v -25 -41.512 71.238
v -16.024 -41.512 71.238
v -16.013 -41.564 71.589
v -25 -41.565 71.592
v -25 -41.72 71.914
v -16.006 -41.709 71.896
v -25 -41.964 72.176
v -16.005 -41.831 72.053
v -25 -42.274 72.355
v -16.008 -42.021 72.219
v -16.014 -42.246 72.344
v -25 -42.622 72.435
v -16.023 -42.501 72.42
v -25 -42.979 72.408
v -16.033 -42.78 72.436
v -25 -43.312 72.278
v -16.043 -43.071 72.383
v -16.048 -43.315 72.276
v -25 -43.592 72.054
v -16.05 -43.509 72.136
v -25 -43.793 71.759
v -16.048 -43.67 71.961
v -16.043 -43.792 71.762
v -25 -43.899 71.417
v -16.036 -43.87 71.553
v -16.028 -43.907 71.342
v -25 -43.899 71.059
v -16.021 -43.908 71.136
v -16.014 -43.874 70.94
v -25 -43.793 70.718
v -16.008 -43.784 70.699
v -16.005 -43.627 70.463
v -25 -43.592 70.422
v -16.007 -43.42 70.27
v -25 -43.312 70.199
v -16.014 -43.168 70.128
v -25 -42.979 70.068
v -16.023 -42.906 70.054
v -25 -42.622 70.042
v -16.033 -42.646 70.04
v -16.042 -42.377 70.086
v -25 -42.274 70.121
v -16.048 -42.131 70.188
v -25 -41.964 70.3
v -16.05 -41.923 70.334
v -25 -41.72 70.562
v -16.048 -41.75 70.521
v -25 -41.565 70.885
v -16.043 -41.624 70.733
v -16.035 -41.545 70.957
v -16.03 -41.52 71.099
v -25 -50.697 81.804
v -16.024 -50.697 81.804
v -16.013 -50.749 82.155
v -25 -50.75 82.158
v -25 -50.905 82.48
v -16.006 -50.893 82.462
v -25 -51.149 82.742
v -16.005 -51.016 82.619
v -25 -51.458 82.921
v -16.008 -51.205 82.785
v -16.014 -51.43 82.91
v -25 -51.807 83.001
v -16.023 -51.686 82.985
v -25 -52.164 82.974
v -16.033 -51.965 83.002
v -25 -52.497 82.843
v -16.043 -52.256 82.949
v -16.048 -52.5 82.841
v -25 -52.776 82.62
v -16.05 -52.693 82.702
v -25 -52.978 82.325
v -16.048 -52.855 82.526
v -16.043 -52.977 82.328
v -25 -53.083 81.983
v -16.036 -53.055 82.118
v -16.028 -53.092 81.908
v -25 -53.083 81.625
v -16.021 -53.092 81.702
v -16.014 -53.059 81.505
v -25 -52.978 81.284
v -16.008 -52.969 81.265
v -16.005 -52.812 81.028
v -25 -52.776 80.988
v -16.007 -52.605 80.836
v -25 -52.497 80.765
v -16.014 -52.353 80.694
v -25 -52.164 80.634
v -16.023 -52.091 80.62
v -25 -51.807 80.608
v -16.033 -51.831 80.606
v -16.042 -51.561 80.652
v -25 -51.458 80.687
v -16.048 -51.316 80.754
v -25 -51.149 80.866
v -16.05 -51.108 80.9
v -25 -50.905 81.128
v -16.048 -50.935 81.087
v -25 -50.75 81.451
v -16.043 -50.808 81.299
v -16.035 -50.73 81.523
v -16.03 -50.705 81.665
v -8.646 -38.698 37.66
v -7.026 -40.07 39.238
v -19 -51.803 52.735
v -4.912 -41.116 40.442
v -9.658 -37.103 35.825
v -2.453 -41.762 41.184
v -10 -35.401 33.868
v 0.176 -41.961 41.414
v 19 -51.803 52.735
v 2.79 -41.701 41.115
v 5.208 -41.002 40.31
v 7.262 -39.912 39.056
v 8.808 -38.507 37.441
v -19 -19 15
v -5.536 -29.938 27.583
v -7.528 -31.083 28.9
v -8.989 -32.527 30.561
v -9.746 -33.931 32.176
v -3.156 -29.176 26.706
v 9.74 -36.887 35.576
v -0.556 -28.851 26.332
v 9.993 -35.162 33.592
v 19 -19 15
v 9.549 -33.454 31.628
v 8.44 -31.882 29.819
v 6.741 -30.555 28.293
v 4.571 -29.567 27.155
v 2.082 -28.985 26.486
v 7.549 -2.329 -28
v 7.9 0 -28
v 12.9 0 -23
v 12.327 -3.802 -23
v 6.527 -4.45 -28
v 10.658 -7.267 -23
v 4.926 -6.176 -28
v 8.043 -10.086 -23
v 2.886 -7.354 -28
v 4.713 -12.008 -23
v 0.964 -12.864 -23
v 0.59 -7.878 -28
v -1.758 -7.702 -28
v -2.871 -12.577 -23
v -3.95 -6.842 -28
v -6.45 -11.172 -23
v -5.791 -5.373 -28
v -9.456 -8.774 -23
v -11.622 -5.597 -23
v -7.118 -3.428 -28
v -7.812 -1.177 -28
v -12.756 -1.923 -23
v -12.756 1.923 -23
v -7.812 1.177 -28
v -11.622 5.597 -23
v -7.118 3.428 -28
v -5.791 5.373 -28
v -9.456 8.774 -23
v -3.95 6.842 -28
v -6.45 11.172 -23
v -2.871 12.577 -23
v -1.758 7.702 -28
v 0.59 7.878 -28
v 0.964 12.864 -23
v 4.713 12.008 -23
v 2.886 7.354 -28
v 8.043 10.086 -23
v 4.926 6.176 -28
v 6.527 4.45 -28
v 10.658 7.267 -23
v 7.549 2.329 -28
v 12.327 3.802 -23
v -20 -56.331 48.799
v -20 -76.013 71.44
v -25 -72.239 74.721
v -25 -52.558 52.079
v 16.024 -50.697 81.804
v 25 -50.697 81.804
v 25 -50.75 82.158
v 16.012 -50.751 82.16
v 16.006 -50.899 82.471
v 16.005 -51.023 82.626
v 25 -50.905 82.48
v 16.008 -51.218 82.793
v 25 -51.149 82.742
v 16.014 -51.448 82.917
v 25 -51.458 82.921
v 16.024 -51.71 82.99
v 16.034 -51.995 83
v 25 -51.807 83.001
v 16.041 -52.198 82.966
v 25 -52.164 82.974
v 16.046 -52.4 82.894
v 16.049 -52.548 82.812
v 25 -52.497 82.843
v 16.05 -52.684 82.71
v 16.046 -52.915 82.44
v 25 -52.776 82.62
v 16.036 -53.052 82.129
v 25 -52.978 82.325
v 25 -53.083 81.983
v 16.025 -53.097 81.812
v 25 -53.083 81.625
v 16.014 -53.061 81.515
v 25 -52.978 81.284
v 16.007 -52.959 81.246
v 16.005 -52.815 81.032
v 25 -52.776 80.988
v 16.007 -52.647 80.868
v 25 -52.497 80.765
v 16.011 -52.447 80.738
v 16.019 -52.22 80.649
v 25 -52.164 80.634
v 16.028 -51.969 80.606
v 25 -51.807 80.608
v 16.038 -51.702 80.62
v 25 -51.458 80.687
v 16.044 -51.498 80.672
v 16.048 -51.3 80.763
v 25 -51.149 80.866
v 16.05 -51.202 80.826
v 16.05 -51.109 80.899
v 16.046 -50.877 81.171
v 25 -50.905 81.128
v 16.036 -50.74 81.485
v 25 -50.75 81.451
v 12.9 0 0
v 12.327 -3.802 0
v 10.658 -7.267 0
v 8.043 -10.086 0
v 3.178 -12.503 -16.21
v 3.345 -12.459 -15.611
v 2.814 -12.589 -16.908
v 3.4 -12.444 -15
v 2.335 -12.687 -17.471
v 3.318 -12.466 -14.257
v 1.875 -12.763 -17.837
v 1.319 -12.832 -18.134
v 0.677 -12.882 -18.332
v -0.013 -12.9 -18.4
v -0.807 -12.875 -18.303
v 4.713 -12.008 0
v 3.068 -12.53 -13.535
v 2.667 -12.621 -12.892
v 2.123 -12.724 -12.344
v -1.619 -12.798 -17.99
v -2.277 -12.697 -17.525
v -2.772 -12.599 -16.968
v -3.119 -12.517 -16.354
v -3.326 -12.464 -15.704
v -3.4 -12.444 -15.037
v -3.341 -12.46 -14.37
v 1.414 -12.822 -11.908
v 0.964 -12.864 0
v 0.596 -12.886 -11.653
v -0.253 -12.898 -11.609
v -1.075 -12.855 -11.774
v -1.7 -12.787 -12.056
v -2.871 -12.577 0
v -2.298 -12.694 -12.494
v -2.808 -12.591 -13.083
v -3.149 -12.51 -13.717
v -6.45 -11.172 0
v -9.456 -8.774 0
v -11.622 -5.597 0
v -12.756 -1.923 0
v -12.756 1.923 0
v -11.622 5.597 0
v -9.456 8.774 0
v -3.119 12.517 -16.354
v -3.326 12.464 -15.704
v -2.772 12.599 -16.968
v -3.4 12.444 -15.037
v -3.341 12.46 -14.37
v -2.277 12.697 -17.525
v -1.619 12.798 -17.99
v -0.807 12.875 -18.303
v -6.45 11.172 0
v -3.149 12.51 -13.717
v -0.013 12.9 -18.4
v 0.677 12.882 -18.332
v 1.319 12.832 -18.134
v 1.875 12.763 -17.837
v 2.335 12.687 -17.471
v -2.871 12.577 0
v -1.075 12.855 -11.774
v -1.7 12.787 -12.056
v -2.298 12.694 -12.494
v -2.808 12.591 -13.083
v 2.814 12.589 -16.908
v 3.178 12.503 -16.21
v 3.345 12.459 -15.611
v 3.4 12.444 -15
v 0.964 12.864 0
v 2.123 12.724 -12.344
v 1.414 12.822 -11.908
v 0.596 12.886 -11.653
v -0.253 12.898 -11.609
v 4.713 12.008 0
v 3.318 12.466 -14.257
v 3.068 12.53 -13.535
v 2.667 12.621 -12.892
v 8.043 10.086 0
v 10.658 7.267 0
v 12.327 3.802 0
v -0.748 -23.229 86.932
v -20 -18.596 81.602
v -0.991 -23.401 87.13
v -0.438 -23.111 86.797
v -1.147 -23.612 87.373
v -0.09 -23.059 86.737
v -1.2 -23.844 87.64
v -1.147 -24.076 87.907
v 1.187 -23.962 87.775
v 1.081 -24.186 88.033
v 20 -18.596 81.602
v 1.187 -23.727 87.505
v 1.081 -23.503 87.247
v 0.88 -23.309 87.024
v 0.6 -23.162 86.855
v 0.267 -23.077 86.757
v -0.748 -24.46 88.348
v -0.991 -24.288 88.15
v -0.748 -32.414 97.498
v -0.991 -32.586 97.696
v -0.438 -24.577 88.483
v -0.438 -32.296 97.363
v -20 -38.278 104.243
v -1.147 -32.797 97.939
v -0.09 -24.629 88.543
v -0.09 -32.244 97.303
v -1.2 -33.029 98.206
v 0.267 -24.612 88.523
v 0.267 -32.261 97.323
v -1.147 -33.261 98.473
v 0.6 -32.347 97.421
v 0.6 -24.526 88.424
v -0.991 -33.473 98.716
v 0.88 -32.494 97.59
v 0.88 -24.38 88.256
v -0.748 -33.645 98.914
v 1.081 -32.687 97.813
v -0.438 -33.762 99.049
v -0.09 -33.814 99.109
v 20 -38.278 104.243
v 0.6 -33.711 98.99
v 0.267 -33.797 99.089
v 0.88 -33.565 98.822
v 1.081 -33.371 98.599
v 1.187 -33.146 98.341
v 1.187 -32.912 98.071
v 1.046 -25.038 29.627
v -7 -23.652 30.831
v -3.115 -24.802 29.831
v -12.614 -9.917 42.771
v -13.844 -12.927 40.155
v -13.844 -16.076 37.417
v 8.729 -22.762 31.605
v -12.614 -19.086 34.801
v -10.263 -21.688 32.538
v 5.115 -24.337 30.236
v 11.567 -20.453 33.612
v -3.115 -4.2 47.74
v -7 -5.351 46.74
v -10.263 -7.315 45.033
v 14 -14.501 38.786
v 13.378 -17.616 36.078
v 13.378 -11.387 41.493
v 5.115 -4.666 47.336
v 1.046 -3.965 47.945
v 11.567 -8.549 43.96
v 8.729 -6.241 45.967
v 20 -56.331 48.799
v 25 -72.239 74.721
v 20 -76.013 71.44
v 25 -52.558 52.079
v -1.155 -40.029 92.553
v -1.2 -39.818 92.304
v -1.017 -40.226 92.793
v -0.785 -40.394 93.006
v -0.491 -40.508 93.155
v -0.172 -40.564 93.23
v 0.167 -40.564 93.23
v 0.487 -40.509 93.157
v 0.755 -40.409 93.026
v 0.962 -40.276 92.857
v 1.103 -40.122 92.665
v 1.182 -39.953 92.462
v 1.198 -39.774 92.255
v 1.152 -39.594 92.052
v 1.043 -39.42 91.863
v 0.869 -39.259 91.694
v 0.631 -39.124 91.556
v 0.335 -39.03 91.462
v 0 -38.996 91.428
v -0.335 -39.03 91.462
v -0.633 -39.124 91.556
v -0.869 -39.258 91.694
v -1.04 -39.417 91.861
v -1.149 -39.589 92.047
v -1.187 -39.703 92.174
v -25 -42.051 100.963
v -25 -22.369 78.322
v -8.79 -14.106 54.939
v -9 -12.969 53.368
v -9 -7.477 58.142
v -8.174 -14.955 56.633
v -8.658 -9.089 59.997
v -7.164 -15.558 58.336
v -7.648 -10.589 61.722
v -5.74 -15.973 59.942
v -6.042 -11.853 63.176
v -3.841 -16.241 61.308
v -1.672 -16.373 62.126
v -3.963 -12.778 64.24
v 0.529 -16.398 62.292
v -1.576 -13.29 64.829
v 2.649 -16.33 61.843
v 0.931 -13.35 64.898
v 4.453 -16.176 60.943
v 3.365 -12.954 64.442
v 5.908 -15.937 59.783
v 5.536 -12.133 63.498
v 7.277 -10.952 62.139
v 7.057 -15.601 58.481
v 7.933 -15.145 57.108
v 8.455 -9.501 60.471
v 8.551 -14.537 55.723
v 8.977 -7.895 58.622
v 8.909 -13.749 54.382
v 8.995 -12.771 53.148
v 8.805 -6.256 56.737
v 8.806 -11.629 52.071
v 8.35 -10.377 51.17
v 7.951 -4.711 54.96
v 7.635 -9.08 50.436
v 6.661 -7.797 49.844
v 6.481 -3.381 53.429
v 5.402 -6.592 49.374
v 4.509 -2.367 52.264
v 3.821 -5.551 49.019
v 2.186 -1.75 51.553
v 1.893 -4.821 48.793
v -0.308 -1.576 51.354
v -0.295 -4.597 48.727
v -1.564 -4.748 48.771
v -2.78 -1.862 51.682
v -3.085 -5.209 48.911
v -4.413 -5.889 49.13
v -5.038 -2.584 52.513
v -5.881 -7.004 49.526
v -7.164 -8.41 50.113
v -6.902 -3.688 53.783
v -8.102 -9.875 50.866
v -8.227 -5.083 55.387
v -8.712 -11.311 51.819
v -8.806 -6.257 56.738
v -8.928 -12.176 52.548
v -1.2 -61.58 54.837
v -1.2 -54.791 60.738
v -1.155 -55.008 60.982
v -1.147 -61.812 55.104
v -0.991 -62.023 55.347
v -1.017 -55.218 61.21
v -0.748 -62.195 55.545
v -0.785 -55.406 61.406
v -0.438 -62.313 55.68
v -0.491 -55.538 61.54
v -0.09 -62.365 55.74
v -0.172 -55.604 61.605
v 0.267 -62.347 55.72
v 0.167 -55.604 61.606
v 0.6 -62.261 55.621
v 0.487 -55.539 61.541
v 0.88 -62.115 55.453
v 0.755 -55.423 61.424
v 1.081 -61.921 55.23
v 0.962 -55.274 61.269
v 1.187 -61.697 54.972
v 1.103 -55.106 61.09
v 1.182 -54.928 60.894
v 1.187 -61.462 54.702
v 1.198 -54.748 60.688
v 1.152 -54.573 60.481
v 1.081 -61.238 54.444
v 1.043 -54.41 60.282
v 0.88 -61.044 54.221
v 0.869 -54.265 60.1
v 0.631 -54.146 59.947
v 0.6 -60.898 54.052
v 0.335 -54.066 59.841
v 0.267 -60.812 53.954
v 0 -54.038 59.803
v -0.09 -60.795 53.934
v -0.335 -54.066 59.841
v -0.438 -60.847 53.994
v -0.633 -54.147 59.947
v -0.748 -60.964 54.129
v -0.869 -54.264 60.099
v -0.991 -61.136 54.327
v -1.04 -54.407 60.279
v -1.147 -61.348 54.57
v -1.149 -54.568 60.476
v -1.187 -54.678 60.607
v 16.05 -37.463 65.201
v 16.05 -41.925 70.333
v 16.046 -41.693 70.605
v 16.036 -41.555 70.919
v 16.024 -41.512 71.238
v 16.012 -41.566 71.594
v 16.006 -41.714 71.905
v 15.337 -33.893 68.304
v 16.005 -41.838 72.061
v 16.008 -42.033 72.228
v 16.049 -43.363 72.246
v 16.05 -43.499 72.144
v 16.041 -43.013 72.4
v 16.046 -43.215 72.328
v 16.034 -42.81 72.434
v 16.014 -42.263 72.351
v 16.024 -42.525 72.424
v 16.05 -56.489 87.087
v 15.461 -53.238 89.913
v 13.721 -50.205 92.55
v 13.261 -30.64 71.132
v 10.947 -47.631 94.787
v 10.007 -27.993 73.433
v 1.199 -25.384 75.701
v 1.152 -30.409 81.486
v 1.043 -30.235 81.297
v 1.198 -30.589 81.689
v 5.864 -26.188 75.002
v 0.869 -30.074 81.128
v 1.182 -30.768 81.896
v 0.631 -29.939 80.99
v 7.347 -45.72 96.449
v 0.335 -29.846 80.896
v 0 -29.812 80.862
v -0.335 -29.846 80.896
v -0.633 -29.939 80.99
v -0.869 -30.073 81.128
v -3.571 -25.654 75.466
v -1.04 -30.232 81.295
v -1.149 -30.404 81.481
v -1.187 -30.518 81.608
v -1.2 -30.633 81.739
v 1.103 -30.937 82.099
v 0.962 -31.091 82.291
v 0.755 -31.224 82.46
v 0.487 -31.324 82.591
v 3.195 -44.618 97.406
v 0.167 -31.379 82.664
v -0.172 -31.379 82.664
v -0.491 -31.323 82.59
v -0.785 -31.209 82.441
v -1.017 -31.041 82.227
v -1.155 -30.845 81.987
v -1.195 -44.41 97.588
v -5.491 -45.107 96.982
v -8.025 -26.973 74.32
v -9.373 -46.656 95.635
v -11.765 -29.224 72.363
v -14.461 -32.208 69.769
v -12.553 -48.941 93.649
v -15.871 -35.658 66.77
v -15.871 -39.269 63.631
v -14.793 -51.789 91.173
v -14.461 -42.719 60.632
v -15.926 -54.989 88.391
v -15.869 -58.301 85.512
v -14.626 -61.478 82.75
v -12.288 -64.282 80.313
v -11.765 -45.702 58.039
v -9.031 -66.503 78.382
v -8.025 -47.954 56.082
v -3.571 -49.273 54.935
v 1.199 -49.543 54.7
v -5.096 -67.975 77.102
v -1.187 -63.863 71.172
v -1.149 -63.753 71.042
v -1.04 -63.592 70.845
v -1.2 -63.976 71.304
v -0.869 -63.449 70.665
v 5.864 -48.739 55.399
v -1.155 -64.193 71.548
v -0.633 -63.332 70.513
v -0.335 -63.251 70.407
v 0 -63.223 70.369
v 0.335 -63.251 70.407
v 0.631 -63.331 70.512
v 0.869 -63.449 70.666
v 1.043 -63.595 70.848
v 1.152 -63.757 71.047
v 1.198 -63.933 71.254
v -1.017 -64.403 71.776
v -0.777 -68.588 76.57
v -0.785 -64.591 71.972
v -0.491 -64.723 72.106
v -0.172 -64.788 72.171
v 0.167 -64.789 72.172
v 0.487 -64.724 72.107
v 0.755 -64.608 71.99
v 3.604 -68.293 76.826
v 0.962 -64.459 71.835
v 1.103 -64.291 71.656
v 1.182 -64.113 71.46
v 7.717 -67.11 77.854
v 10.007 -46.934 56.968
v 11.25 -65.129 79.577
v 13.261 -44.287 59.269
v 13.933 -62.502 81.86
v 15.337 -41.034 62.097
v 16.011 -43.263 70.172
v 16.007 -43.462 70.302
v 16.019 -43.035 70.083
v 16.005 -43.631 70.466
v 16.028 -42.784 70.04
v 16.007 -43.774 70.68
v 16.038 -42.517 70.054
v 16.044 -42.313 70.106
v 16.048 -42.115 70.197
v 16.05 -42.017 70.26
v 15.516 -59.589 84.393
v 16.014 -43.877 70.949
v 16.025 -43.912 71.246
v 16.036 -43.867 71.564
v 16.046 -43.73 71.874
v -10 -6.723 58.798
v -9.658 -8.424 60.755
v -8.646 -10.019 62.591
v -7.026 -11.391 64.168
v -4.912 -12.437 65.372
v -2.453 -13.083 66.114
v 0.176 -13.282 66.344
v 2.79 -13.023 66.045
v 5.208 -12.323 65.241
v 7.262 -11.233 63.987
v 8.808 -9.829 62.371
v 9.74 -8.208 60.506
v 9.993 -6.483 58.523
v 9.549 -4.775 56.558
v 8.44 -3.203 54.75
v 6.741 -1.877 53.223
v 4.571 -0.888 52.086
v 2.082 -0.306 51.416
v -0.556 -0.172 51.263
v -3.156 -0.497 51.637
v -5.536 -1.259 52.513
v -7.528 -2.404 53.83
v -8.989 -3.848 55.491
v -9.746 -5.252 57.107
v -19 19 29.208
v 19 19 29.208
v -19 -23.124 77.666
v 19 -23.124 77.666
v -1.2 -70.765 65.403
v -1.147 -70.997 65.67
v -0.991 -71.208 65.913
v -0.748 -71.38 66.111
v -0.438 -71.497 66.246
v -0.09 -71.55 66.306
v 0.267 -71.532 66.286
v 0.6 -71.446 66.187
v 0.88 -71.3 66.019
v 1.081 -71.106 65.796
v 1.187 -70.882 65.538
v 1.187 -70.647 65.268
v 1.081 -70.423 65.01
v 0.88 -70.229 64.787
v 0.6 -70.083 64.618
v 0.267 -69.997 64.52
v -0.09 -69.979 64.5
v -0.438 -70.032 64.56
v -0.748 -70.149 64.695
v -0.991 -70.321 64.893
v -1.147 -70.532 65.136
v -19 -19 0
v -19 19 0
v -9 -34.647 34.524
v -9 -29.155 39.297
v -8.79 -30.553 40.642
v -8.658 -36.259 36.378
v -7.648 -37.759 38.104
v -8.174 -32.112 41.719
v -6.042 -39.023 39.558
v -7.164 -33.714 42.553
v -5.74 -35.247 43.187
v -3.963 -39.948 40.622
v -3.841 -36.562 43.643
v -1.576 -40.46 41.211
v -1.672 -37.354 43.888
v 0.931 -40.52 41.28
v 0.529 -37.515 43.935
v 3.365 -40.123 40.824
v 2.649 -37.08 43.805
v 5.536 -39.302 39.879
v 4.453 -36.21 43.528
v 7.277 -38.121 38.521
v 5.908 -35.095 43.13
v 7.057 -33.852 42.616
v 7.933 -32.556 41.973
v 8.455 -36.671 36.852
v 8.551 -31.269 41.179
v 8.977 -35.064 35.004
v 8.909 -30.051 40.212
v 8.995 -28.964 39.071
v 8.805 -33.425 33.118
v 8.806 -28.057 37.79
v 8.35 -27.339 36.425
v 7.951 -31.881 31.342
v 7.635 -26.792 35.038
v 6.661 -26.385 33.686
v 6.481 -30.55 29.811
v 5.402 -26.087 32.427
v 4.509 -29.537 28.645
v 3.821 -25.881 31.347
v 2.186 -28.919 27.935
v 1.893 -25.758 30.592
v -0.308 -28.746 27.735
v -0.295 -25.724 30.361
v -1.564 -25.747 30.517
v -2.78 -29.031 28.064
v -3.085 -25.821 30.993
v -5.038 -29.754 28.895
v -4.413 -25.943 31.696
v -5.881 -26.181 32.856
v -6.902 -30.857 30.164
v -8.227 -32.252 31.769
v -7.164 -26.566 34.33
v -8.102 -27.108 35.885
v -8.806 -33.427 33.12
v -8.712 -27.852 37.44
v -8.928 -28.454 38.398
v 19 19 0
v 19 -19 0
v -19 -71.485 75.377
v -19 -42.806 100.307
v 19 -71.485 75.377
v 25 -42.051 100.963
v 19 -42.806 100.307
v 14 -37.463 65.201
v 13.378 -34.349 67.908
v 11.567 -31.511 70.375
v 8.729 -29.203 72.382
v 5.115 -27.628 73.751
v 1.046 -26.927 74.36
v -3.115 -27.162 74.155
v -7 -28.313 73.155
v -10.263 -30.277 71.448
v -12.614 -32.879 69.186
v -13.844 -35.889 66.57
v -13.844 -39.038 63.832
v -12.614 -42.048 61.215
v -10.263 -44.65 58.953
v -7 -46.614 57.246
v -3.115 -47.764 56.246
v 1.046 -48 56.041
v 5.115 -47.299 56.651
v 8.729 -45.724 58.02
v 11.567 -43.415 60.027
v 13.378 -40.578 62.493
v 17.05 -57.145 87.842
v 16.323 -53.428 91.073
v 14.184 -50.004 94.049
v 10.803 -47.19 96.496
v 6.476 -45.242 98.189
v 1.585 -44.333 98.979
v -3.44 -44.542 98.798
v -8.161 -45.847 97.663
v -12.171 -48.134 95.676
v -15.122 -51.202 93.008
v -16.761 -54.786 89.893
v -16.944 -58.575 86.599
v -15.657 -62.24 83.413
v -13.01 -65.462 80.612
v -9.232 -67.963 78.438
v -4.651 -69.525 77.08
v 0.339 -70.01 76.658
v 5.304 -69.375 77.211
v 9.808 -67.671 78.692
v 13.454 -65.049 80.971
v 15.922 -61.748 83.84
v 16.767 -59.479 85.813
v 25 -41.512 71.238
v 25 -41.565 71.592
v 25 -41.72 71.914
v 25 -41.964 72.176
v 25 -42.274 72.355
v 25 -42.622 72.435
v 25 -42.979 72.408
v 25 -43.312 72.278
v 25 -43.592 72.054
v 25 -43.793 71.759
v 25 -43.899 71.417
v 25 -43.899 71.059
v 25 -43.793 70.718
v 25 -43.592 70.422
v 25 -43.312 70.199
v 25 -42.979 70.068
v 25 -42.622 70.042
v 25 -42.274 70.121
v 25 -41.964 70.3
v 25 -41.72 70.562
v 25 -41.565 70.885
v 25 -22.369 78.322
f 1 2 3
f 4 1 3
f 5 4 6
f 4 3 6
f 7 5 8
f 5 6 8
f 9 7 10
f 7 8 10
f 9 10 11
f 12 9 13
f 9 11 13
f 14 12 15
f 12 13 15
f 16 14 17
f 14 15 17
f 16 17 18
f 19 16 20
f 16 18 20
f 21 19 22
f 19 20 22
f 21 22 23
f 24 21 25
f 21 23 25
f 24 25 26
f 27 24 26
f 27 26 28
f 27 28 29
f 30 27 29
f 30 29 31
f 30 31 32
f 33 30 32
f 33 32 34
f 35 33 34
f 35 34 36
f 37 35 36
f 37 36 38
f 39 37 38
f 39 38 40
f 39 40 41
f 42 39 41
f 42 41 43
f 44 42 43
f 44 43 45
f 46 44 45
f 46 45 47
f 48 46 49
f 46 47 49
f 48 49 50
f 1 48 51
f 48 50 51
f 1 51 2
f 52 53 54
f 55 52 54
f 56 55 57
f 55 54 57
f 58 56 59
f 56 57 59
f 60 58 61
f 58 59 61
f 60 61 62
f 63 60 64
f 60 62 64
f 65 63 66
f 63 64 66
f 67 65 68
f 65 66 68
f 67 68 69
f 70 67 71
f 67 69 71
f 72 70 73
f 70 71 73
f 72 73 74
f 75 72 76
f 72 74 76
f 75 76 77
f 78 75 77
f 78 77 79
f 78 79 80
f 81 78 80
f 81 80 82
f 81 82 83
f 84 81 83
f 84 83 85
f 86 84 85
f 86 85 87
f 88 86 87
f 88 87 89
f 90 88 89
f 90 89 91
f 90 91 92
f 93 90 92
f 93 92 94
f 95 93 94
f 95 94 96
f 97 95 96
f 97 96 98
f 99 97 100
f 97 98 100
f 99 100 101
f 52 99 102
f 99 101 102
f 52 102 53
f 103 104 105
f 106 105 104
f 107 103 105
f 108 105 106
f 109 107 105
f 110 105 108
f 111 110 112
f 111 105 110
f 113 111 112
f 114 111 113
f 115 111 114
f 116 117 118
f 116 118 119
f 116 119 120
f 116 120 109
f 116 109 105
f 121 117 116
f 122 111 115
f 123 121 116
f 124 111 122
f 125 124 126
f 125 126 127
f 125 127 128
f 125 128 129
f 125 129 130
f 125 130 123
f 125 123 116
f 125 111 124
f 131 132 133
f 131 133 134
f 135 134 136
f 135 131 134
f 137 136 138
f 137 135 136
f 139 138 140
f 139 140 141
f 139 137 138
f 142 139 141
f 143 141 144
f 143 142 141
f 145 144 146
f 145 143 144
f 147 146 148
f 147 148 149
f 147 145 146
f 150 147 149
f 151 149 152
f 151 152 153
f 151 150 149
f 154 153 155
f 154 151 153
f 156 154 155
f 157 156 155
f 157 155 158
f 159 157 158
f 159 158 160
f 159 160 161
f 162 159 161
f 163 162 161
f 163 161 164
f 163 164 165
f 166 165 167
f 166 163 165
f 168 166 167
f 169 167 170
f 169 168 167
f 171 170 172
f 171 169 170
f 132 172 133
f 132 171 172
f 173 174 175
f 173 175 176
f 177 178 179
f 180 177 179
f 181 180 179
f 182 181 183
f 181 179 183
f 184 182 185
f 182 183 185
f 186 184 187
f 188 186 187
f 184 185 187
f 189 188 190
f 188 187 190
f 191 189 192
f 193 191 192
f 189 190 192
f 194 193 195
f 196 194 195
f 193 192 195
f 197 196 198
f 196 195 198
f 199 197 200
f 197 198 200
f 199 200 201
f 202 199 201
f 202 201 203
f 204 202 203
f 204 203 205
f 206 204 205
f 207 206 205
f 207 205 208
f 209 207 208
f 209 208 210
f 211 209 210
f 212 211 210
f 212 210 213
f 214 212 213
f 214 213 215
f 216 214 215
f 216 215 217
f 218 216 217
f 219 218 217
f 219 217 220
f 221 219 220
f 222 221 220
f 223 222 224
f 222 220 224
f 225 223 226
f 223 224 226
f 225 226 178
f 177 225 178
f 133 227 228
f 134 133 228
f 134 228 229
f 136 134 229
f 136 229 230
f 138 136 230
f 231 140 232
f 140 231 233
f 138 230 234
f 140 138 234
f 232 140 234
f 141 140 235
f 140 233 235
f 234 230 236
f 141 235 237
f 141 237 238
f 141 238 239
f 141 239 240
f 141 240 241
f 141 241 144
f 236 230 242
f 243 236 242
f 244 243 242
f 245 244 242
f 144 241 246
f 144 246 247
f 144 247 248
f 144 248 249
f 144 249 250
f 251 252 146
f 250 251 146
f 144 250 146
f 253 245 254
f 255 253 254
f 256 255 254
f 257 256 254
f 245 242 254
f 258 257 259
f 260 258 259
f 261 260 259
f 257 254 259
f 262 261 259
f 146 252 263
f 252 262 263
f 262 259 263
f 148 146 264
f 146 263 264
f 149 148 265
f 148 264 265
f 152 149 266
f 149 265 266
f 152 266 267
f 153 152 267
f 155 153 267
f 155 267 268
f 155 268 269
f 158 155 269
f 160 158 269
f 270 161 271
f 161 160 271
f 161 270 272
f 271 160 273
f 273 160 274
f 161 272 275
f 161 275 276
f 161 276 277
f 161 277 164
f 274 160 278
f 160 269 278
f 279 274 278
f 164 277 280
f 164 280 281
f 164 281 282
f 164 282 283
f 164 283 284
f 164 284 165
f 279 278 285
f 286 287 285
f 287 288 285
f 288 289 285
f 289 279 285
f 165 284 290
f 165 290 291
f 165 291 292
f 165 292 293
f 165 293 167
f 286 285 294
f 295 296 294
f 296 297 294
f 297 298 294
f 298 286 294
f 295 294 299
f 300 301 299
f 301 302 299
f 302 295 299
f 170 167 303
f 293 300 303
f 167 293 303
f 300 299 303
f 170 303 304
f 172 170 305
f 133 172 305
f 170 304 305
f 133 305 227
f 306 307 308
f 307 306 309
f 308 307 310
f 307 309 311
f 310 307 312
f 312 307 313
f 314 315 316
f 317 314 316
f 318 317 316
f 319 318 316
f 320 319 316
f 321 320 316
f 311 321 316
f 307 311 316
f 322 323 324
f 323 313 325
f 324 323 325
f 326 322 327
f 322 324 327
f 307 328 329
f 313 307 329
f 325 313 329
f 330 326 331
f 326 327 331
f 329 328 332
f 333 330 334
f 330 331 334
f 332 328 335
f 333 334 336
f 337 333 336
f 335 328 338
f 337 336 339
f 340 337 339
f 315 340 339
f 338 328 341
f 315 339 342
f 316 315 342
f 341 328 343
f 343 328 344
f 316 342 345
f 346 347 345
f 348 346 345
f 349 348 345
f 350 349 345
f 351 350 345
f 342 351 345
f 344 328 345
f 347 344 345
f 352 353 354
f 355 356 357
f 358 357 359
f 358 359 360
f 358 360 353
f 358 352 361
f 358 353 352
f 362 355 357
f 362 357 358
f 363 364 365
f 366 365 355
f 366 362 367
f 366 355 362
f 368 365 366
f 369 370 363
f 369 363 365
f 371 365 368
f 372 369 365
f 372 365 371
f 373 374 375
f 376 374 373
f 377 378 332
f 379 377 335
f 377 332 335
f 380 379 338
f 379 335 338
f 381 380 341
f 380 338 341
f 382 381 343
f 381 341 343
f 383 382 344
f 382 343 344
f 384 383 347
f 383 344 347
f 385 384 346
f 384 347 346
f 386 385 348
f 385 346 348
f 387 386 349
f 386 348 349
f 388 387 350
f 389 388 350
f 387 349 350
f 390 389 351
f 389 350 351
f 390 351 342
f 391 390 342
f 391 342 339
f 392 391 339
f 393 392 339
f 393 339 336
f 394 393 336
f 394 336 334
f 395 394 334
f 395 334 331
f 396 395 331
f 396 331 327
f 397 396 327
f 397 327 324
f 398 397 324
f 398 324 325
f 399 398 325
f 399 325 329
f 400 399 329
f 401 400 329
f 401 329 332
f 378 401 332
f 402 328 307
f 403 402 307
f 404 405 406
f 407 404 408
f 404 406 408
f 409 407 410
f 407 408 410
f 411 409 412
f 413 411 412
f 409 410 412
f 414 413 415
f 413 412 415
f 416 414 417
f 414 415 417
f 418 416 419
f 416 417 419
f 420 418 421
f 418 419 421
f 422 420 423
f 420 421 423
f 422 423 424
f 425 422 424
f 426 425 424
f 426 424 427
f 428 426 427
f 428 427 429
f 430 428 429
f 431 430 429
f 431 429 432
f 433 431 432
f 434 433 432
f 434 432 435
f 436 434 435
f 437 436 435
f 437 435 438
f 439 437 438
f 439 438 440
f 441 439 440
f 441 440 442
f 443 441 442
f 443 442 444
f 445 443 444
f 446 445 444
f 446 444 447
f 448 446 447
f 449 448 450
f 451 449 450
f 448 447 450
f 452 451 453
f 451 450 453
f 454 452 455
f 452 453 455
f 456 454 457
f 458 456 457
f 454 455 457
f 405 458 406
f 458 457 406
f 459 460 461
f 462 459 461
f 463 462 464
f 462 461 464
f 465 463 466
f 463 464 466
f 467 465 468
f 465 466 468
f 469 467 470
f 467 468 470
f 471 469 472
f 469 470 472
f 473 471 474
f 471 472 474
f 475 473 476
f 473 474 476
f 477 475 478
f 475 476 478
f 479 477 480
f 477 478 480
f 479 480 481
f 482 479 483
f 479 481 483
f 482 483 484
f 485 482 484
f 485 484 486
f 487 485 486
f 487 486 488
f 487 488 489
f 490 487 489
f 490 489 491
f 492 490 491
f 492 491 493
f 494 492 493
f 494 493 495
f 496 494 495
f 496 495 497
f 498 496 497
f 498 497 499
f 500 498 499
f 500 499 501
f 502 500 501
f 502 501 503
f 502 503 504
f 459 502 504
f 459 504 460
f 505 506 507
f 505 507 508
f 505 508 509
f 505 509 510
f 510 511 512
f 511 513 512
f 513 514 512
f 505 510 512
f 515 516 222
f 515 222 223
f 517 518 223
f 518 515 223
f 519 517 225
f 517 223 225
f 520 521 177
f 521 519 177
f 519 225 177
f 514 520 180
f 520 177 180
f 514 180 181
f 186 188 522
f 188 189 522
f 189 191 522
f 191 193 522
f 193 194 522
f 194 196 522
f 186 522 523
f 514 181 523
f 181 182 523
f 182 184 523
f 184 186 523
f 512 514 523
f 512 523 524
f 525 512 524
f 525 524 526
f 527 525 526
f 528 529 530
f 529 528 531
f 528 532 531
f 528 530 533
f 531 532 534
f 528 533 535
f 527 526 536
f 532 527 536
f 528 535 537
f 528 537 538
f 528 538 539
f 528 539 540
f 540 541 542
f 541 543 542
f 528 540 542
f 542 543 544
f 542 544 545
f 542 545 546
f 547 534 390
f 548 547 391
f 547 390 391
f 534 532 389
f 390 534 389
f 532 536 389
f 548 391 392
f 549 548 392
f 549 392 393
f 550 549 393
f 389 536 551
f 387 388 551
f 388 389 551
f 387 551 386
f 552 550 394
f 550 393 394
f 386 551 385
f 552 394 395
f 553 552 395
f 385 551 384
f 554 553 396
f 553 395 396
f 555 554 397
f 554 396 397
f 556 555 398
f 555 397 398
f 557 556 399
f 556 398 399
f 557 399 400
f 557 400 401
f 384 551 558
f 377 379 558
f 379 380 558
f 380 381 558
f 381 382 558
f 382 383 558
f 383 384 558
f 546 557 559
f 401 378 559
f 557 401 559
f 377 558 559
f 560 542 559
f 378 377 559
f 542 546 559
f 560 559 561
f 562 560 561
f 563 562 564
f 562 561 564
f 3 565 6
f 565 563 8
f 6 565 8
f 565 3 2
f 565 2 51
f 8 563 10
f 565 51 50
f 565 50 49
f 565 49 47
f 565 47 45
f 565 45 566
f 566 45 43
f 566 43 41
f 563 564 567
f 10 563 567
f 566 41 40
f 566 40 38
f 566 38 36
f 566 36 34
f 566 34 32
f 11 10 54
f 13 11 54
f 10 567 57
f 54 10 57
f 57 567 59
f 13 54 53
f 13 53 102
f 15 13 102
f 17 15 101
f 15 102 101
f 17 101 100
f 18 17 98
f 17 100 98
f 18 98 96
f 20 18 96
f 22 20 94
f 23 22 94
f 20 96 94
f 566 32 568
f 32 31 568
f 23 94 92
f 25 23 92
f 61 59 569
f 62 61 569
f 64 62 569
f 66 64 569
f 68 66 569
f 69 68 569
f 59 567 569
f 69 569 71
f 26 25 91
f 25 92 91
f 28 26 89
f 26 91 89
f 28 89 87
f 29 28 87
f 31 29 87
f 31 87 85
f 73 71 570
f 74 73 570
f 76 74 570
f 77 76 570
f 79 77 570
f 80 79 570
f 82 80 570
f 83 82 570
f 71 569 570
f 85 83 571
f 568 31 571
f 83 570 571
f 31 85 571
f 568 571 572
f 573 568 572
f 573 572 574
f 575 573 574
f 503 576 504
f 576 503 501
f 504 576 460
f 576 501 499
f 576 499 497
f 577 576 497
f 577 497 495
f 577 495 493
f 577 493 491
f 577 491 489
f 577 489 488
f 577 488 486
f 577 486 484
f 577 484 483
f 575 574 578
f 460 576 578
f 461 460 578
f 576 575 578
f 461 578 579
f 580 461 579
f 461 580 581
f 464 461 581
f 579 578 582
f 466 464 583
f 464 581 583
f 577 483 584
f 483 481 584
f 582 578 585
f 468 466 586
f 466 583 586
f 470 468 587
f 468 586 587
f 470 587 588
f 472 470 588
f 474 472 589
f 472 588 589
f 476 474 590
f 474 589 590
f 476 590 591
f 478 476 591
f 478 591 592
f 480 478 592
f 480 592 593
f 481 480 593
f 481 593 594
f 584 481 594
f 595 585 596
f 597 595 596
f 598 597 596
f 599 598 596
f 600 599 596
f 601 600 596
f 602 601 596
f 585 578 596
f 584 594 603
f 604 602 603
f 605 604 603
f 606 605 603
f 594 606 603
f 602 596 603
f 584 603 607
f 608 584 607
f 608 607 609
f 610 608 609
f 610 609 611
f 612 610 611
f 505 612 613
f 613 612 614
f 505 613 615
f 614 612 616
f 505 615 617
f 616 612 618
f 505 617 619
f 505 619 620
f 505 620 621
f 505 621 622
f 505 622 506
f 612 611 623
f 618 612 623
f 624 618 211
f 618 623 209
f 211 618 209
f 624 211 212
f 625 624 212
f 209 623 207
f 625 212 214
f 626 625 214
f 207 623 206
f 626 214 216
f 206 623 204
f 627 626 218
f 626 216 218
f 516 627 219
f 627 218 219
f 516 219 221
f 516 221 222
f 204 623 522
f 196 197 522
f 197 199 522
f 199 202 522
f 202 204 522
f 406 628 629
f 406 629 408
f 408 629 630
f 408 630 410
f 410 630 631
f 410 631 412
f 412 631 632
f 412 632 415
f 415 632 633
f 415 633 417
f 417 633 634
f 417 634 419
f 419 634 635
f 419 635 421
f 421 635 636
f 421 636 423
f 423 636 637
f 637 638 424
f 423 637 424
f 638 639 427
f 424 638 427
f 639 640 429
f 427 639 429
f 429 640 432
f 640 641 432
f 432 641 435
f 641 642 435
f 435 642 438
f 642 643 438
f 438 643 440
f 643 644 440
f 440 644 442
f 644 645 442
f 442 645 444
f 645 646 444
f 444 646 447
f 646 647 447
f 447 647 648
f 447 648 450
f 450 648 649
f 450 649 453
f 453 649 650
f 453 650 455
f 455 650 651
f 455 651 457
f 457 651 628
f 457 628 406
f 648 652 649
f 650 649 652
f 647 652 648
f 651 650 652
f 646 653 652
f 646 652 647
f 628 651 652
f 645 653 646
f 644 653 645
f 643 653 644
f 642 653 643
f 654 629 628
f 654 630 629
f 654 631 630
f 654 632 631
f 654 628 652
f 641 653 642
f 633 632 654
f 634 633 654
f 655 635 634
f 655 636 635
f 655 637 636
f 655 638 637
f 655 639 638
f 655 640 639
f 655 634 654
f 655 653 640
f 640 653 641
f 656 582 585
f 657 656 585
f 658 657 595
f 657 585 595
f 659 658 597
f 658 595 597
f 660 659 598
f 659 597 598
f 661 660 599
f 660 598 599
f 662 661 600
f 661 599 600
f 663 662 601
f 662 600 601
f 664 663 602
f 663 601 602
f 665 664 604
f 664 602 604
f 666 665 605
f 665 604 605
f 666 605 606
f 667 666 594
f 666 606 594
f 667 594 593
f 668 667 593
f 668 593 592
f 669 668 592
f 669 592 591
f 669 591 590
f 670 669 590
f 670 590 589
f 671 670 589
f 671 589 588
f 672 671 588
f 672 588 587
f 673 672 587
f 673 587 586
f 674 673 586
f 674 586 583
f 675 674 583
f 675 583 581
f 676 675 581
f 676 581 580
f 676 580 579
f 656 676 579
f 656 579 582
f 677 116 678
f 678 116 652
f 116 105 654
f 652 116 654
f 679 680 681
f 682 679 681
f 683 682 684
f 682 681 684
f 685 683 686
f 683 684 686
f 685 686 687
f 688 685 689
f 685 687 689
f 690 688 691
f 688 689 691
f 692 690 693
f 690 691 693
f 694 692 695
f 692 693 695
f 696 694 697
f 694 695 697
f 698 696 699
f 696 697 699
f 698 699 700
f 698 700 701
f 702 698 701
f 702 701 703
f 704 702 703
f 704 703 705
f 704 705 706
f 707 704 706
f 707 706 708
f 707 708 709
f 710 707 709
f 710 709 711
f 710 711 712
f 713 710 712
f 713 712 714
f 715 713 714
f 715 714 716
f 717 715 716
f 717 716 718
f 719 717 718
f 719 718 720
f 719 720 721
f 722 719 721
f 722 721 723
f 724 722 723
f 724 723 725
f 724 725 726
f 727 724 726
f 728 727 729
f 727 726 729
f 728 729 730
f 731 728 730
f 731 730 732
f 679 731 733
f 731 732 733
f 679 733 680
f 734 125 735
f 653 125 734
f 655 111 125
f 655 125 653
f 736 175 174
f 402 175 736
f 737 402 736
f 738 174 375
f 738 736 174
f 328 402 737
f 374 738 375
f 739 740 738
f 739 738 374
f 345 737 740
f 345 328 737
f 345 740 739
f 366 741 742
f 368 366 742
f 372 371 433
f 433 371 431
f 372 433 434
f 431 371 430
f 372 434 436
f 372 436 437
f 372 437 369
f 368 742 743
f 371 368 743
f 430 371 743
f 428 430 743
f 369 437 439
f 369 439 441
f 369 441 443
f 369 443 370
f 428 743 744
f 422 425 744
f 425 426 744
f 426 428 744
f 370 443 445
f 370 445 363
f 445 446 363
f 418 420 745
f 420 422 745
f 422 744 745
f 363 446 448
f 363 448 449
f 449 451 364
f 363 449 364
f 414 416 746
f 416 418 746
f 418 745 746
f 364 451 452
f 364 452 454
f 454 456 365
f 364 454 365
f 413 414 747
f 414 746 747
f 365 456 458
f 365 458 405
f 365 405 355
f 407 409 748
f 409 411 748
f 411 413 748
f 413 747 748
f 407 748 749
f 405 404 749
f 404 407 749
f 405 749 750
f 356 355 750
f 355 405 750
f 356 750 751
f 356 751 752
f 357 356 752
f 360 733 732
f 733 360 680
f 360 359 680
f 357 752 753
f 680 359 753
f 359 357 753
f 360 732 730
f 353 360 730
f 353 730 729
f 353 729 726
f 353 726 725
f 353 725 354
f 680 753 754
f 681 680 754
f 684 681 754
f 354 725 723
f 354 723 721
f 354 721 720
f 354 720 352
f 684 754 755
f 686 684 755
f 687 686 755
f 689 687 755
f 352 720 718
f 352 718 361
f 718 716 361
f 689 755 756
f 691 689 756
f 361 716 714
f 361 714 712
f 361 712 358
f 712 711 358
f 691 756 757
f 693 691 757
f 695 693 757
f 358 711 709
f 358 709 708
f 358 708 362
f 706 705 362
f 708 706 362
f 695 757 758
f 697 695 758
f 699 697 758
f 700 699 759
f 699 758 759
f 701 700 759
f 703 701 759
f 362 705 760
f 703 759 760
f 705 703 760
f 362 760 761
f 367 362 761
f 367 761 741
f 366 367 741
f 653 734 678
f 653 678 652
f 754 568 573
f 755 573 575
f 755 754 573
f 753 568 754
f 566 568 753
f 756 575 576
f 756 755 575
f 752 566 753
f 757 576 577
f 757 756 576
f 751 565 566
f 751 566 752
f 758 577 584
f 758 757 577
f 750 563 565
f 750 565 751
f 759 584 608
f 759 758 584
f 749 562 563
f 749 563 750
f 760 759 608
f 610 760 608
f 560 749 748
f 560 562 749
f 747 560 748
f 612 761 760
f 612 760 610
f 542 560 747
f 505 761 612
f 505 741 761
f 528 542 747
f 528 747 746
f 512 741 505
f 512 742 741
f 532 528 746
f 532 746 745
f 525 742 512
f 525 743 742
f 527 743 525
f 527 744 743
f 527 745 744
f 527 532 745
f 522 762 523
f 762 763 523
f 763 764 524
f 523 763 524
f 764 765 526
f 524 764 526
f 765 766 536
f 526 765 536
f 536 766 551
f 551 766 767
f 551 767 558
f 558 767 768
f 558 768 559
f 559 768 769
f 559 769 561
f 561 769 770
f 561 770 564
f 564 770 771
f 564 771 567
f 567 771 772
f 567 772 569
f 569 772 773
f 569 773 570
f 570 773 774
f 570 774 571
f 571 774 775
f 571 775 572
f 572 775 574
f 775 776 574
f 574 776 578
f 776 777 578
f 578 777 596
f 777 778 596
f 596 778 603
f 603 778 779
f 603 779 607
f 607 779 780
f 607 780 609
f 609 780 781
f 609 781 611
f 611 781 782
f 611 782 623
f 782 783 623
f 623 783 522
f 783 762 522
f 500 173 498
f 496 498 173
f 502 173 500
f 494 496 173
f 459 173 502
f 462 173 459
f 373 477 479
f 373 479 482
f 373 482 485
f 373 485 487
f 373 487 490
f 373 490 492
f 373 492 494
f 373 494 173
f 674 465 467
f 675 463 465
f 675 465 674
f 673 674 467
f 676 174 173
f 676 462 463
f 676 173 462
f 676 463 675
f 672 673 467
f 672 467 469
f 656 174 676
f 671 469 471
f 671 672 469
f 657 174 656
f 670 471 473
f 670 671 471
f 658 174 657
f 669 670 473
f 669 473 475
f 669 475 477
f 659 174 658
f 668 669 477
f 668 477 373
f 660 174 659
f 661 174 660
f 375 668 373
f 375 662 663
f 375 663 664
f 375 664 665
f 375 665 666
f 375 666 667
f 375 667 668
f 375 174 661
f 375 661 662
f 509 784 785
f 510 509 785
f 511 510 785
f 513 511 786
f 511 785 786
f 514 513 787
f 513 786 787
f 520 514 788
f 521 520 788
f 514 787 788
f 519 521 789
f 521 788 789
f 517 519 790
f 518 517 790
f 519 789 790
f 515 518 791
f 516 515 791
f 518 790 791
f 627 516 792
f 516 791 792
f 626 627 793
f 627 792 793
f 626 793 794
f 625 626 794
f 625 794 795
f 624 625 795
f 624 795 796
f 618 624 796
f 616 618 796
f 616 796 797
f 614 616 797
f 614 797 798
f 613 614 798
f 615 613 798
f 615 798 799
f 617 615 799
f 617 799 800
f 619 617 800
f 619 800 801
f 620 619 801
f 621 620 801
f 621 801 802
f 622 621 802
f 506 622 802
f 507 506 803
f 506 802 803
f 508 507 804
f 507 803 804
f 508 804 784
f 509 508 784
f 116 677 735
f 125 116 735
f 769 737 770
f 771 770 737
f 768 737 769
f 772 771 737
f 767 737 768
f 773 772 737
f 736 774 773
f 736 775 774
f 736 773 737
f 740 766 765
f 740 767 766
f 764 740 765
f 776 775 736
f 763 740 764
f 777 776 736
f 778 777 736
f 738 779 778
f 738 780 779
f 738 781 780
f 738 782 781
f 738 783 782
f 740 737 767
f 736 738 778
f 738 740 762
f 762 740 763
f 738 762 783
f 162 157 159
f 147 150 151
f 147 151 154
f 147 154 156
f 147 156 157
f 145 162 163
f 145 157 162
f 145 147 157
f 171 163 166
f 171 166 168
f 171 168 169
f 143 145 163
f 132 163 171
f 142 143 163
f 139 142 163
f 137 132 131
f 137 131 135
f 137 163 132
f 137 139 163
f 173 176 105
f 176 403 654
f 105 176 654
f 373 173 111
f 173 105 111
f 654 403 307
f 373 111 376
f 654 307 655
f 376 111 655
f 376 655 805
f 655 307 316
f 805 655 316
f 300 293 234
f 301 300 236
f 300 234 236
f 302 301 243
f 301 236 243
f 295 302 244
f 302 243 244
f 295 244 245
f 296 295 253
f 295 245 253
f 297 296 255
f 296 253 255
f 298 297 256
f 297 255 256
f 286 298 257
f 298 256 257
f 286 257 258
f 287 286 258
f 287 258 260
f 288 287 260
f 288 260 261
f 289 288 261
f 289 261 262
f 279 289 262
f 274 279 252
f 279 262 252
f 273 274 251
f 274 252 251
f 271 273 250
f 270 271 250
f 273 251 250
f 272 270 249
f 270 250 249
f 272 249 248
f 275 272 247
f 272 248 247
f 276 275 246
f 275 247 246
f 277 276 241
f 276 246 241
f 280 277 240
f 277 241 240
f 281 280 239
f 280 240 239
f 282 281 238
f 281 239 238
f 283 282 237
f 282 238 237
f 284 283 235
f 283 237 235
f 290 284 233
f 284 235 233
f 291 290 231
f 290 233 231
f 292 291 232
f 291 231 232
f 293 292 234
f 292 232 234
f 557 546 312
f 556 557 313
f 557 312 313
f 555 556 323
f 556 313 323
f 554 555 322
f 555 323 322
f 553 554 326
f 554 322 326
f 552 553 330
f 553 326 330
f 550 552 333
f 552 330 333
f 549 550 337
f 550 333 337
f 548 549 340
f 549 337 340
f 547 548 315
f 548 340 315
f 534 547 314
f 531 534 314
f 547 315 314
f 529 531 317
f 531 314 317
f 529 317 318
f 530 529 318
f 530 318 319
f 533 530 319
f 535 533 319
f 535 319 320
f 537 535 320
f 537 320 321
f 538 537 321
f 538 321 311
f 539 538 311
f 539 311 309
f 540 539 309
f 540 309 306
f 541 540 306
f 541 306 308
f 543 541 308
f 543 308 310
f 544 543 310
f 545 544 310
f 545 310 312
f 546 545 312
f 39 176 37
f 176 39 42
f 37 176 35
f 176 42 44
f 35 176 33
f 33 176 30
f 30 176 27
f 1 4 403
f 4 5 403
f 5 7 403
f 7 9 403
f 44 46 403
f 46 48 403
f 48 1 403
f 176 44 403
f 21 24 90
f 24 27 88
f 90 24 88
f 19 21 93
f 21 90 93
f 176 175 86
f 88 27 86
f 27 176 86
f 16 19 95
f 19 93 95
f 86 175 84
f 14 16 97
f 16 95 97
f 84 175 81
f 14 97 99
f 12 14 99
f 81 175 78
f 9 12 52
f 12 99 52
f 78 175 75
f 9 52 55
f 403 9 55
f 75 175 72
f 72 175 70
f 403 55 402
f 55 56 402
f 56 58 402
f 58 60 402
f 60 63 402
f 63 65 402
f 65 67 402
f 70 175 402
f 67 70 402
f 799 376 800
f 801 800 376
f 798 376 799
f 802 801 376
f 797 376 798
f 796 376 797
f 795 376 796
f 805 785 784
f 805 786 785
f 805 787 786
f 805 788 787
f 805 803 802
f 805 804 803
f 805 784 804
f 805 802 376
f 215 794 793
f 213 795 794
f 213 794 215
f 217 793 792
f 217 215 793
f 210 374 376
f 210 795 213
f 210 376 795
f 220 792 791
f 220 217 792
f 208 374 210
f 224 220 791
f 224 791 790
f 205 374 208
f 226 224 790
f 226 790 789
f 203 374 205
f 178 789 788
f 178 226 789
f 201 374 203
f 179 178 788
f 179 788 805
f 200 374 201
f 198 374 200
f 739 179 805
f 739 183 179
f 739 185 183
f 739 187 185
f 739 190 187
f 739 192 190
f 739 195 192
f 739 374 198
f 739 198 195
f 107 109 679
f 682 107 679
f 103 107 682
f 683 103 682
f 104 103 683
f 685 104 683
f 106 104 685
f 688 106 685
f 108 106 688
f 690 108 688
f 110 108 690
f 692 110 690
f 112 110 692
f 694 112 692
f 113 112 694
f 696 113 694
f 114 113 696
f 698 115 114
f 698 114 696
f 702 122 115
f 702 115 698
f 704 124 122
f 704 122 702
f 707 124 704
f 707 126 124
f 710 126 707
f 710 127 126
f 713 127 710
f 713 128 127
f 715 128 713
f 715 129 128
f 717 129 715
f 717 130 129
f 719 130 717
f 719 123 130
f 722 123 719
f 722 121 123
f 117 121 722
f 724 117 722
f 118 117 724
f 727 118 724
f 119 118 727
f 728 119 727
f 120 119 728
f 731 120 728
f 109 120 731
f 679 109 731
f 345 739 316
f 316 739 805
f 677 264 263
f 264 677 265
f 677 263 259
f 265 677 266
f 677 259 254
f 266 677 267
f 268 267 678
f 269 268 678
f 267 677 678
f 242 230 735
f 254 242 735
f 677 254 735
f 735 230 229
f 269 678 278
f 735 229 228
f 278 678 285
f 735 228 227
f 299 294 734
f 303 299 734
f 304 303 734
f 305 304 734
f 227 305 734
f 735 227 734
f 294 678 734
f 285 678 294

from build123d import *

# Parameters (mm, degrees)
F0_W      = 38
F0_H      = 38
F1_DEPTH  = 15
F2_R      = 12.9
F3_DEPTH  = 28
F4_R      = 3.4
F5_DEPTH  = 21
F7_DEPTH  = 38
F8_R      = 14
F9_DEPTH  = 65
F10_R     = 16.05
F11_DEPTH = 30
F12_W     = 50
F12_H     = 50
F12_R     = 16.05
F13_DEPTH = 30
F14_R     = 9
F15_DEPTH = 109.2397803647
F16_R     = 1.2
F17_DEPTH = 115.2397803647
F18_R     = 1.2
F19_DEPTH = 50.001
F20_SIZE  = 5
F21_SIZE  = 1


with BuildPart() as f1:
    # F0 (on Top) → F1 (new body)
    with BuildSketch(Plane.XY):
        Rectangle(F0_W, F0_H)
    extrude(amount=F1_DEPTH)

    # F2 (on face) → F3 (join)
    with BuildSketch(Plane(origin=(0, 0, 0), x_dir=(1, 0, 0), z_dir=(0, 0, -1))):
        Circle(F2_R)
    extrude(amount=F3_DEPTH)

    # F4 (on Front) → F5 (cut, symmetric)
    with BuildSketch(Plane.XZ):
        with Locations((0, -15)):
            Circle(F4_R)
    extrude(amount=F5_DEPTH, both=True, mode=Mode.SUBTRACT)

    # F6 (on face) → F7 (join)
    with BuildSketch(Plane.YZ.offset(19)):
        Polygon((-71.4847223192, 75.3767664178), (-19, 15), (19, 15), (19, 29.2076178204), (-42.8057582708, 100.3070095195), align=None)
    extrude(amount=-F7_DEPTH)

    # F8 (on face) → F9 (cut)
    with BuildSketch(Plane(origin=(0, -68.0895883757, 78.3281113281), x_dir=(1, 0, 0), z_dir=(0, -0.656059029, 0.7547095802))):
        with Locations((0, 14.5014034106)):
            Circle(F8_R)
    extrude(amount=-F9_DEPTH, mode=Mode.SUBTRACT)

    # F10 (on face) → F11 (cut)
    with BuildSketch(Plane(origin=(0, -68.0895883757, 78.3281113281), x_dir=(1, 0, 0), z_dir=(0, -0.656059029, 0.7547095802))):
        with Locations((0, 14.5014034106)):
            Circle(F10_R)
    extrude(amount=-F11_DEPTH, mode=Mode.SUBTRACT)

    # F12 (on face) → F13 (join)
    with BuildSketch(Plane(origin=(0, -68.0895883757, 78.3281113281), x_dir=(1, 0, 0), z_dir=(0, -0.656059029, 0.7547095802))):
        with Locations((0, 14.5014034106)):
            Rectangle(F12_W, F12_H)
        with Locations((0, 14.5014034106)):
            Circle(F12_R, mode=Mode.SUBTRACT)
    extrude(amount=-F13_DEPTH)

    # F14 (on face) → F15 (cut, through all)
    with BuildSketch(Plane(origin=(0, 25.2838301049, 21.9788981914), x_dir=(-1, 0, 0), z_dir=(0, 0.7547095802, 0.656059029))):
        with Locations((0, 48.7857652542)):
            Circle(F14_R)
    extrude(amount=-F15_DEPTH, mode=Mode.SUBTRACT)

    # F16 (on face) → F17 (cut, through all)
    with BuildSketch(Plane(origin=(0, 29.8120875862, 25.9152523653), x_dir=(-1, 0, 0), z_dir=(0, 0.7547095802, 0.656059029))):
        with Locations((0, 95.7857652542)):
            Circle(F16_R)
        with Locations((0, 81.7857652542)):
            Circle(F16_R)
    extrude(amount=-F17_DEPTH, mode=Mode.SUBTRACT)

    # F18 (on face) → F19 (cut, through all)
    with BuildSketch(Plane.YZ.offset(25)):
        with Locations((-51.8967680631, 81.8042113269)):
            Circle(F18_R)
        with Locations((-42.7119416572, 71.2382772037)):
            Circle(F18_R)
    extrude(amount=-F19_DEPTH, mode=Mode.SUBTRACT)

    # F20
    f20_edges = [f1.edges().sort_by_distance(p)[0] for p in [
        (-12.9, 0, -28),
        (25, -28.436615, 92.92272),
        (25, -66.172094, 60.119769),
        (-25, -66.172094, 60.119769),
        (-25, -28.436615, 92.92272),
    ]]
    chamfer(f20_edges, length=F20_SIZE)

    # F21
    f21_edges = [f1.edges().sort_by_distance(p)[0] for p in [
        (-16.05, -57.14524, 87.841888),
        (9, -35.401476, 33.86774),
        (9, -6.722512, 58.797983),
    ]]
    chamfer(f21_edges, length=F21_SIZE)


solid = f1.part
